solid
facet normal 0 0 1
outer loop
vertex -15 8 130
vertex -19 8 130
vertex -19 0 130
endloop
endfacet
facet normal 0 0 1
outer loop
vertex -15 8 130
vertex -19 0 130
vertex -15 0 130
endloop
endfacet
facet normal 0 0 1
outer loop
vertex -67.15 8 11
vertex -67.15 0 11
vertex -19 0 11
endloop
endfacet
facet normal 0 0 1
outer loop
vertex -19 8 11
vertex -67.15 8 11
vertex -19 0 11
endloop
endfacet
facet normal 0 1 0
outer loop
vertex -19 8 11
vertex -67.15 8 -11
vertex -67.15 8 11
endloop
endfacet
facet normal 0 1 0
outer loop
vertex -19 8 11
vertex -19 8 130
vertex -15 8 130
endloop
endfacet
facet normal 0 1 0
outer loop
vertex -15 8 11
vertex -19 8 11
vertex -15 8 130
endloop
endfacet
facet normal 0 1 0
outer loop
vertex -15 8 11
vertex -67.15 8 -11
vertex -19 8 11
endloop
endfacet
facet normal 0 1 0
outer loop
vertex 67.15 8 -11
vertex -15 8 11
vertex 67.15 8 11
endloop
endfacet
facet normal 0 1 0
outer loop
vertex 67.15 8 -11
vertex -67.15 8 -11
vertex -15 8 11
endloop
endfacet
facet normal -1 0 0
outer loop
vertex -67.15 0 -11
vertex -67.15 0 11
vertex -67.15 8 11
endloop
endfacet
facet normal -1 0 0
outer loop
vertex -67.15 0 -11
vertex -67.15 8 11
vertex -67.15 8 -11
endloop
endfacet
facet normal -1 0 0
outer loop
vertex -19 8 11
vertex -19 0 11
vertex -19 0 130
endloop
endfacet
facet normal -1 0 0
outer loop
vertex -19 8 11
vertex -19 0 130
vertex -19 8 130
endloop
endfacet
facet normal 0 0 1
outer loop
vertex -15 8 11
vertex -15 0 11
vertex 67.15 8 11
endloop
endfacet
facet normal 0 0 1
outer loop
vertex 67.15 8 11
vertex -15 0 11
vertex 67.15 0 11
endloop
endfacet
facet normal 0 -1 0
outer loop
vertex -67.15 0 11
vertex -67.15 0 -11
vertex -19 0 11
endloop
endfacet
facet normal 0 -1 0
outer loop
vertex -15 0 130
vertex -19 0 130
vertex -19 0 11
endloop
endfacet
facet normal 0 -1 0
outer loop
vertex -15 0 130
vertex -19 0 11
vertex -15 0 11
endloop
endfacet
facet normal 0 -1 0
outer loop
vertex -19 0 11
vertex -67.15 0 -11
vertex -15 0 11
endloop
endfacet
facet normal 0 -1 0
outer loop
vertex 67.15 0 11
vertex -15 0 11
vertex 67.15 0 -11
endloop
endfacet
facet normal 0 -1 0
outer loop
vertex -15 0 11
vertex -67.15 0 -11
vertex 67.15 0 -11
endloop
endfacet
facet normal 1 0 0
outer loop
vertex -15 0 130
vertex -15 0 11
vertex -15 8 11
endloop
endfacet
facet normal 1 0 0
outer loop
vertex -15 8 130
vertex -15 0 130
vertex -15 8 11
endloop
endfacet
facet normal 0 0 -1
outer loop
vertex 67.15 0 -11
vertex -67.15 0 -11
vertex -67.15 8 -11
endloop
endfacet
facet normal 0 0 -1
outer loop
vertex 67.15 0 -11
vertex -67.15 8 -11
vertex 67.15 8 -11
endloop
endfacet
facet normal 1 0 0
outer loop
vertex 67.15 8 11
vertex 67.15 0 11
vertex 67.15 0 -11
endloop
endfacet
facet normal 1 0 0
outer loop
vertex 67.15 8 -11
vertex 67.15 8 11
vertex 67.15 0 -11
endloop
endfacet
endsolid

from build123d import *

# Parameters (mm, degrees)
SKETCH_1_W      = 134.3
SKETCH_1_H      = 22
EXTRUDE_1_DEPTH = 8
SKETCH_2_W      = 4
SKETCH_2_H      = 8
EXTRUDE_2_DEPTH = 130


with BuildPart() as part:
    # 草图1 → 凸台-拉伸1 (new body)
    with BuildSketch(Plane(origin=(0, 0, 0), x_dir=(1, 0, 0), z_dir=(0, 1, 0))):
        Rectangle(SKETCH_1_W, SKETCH_1_H)
    extrude(amount=EXTRUDE_1_DEPTH)

    # 草图2 → 凸台-拉伸2 (add)
    with BuildSketch(Plane.XY):
        with Locations((-17, 4)):
            Rectangle(SKETCH_2_W, SKETCH_2_H)
    extrude(amount=EXTRUDE_2_DEPTH)


solid = part.part
